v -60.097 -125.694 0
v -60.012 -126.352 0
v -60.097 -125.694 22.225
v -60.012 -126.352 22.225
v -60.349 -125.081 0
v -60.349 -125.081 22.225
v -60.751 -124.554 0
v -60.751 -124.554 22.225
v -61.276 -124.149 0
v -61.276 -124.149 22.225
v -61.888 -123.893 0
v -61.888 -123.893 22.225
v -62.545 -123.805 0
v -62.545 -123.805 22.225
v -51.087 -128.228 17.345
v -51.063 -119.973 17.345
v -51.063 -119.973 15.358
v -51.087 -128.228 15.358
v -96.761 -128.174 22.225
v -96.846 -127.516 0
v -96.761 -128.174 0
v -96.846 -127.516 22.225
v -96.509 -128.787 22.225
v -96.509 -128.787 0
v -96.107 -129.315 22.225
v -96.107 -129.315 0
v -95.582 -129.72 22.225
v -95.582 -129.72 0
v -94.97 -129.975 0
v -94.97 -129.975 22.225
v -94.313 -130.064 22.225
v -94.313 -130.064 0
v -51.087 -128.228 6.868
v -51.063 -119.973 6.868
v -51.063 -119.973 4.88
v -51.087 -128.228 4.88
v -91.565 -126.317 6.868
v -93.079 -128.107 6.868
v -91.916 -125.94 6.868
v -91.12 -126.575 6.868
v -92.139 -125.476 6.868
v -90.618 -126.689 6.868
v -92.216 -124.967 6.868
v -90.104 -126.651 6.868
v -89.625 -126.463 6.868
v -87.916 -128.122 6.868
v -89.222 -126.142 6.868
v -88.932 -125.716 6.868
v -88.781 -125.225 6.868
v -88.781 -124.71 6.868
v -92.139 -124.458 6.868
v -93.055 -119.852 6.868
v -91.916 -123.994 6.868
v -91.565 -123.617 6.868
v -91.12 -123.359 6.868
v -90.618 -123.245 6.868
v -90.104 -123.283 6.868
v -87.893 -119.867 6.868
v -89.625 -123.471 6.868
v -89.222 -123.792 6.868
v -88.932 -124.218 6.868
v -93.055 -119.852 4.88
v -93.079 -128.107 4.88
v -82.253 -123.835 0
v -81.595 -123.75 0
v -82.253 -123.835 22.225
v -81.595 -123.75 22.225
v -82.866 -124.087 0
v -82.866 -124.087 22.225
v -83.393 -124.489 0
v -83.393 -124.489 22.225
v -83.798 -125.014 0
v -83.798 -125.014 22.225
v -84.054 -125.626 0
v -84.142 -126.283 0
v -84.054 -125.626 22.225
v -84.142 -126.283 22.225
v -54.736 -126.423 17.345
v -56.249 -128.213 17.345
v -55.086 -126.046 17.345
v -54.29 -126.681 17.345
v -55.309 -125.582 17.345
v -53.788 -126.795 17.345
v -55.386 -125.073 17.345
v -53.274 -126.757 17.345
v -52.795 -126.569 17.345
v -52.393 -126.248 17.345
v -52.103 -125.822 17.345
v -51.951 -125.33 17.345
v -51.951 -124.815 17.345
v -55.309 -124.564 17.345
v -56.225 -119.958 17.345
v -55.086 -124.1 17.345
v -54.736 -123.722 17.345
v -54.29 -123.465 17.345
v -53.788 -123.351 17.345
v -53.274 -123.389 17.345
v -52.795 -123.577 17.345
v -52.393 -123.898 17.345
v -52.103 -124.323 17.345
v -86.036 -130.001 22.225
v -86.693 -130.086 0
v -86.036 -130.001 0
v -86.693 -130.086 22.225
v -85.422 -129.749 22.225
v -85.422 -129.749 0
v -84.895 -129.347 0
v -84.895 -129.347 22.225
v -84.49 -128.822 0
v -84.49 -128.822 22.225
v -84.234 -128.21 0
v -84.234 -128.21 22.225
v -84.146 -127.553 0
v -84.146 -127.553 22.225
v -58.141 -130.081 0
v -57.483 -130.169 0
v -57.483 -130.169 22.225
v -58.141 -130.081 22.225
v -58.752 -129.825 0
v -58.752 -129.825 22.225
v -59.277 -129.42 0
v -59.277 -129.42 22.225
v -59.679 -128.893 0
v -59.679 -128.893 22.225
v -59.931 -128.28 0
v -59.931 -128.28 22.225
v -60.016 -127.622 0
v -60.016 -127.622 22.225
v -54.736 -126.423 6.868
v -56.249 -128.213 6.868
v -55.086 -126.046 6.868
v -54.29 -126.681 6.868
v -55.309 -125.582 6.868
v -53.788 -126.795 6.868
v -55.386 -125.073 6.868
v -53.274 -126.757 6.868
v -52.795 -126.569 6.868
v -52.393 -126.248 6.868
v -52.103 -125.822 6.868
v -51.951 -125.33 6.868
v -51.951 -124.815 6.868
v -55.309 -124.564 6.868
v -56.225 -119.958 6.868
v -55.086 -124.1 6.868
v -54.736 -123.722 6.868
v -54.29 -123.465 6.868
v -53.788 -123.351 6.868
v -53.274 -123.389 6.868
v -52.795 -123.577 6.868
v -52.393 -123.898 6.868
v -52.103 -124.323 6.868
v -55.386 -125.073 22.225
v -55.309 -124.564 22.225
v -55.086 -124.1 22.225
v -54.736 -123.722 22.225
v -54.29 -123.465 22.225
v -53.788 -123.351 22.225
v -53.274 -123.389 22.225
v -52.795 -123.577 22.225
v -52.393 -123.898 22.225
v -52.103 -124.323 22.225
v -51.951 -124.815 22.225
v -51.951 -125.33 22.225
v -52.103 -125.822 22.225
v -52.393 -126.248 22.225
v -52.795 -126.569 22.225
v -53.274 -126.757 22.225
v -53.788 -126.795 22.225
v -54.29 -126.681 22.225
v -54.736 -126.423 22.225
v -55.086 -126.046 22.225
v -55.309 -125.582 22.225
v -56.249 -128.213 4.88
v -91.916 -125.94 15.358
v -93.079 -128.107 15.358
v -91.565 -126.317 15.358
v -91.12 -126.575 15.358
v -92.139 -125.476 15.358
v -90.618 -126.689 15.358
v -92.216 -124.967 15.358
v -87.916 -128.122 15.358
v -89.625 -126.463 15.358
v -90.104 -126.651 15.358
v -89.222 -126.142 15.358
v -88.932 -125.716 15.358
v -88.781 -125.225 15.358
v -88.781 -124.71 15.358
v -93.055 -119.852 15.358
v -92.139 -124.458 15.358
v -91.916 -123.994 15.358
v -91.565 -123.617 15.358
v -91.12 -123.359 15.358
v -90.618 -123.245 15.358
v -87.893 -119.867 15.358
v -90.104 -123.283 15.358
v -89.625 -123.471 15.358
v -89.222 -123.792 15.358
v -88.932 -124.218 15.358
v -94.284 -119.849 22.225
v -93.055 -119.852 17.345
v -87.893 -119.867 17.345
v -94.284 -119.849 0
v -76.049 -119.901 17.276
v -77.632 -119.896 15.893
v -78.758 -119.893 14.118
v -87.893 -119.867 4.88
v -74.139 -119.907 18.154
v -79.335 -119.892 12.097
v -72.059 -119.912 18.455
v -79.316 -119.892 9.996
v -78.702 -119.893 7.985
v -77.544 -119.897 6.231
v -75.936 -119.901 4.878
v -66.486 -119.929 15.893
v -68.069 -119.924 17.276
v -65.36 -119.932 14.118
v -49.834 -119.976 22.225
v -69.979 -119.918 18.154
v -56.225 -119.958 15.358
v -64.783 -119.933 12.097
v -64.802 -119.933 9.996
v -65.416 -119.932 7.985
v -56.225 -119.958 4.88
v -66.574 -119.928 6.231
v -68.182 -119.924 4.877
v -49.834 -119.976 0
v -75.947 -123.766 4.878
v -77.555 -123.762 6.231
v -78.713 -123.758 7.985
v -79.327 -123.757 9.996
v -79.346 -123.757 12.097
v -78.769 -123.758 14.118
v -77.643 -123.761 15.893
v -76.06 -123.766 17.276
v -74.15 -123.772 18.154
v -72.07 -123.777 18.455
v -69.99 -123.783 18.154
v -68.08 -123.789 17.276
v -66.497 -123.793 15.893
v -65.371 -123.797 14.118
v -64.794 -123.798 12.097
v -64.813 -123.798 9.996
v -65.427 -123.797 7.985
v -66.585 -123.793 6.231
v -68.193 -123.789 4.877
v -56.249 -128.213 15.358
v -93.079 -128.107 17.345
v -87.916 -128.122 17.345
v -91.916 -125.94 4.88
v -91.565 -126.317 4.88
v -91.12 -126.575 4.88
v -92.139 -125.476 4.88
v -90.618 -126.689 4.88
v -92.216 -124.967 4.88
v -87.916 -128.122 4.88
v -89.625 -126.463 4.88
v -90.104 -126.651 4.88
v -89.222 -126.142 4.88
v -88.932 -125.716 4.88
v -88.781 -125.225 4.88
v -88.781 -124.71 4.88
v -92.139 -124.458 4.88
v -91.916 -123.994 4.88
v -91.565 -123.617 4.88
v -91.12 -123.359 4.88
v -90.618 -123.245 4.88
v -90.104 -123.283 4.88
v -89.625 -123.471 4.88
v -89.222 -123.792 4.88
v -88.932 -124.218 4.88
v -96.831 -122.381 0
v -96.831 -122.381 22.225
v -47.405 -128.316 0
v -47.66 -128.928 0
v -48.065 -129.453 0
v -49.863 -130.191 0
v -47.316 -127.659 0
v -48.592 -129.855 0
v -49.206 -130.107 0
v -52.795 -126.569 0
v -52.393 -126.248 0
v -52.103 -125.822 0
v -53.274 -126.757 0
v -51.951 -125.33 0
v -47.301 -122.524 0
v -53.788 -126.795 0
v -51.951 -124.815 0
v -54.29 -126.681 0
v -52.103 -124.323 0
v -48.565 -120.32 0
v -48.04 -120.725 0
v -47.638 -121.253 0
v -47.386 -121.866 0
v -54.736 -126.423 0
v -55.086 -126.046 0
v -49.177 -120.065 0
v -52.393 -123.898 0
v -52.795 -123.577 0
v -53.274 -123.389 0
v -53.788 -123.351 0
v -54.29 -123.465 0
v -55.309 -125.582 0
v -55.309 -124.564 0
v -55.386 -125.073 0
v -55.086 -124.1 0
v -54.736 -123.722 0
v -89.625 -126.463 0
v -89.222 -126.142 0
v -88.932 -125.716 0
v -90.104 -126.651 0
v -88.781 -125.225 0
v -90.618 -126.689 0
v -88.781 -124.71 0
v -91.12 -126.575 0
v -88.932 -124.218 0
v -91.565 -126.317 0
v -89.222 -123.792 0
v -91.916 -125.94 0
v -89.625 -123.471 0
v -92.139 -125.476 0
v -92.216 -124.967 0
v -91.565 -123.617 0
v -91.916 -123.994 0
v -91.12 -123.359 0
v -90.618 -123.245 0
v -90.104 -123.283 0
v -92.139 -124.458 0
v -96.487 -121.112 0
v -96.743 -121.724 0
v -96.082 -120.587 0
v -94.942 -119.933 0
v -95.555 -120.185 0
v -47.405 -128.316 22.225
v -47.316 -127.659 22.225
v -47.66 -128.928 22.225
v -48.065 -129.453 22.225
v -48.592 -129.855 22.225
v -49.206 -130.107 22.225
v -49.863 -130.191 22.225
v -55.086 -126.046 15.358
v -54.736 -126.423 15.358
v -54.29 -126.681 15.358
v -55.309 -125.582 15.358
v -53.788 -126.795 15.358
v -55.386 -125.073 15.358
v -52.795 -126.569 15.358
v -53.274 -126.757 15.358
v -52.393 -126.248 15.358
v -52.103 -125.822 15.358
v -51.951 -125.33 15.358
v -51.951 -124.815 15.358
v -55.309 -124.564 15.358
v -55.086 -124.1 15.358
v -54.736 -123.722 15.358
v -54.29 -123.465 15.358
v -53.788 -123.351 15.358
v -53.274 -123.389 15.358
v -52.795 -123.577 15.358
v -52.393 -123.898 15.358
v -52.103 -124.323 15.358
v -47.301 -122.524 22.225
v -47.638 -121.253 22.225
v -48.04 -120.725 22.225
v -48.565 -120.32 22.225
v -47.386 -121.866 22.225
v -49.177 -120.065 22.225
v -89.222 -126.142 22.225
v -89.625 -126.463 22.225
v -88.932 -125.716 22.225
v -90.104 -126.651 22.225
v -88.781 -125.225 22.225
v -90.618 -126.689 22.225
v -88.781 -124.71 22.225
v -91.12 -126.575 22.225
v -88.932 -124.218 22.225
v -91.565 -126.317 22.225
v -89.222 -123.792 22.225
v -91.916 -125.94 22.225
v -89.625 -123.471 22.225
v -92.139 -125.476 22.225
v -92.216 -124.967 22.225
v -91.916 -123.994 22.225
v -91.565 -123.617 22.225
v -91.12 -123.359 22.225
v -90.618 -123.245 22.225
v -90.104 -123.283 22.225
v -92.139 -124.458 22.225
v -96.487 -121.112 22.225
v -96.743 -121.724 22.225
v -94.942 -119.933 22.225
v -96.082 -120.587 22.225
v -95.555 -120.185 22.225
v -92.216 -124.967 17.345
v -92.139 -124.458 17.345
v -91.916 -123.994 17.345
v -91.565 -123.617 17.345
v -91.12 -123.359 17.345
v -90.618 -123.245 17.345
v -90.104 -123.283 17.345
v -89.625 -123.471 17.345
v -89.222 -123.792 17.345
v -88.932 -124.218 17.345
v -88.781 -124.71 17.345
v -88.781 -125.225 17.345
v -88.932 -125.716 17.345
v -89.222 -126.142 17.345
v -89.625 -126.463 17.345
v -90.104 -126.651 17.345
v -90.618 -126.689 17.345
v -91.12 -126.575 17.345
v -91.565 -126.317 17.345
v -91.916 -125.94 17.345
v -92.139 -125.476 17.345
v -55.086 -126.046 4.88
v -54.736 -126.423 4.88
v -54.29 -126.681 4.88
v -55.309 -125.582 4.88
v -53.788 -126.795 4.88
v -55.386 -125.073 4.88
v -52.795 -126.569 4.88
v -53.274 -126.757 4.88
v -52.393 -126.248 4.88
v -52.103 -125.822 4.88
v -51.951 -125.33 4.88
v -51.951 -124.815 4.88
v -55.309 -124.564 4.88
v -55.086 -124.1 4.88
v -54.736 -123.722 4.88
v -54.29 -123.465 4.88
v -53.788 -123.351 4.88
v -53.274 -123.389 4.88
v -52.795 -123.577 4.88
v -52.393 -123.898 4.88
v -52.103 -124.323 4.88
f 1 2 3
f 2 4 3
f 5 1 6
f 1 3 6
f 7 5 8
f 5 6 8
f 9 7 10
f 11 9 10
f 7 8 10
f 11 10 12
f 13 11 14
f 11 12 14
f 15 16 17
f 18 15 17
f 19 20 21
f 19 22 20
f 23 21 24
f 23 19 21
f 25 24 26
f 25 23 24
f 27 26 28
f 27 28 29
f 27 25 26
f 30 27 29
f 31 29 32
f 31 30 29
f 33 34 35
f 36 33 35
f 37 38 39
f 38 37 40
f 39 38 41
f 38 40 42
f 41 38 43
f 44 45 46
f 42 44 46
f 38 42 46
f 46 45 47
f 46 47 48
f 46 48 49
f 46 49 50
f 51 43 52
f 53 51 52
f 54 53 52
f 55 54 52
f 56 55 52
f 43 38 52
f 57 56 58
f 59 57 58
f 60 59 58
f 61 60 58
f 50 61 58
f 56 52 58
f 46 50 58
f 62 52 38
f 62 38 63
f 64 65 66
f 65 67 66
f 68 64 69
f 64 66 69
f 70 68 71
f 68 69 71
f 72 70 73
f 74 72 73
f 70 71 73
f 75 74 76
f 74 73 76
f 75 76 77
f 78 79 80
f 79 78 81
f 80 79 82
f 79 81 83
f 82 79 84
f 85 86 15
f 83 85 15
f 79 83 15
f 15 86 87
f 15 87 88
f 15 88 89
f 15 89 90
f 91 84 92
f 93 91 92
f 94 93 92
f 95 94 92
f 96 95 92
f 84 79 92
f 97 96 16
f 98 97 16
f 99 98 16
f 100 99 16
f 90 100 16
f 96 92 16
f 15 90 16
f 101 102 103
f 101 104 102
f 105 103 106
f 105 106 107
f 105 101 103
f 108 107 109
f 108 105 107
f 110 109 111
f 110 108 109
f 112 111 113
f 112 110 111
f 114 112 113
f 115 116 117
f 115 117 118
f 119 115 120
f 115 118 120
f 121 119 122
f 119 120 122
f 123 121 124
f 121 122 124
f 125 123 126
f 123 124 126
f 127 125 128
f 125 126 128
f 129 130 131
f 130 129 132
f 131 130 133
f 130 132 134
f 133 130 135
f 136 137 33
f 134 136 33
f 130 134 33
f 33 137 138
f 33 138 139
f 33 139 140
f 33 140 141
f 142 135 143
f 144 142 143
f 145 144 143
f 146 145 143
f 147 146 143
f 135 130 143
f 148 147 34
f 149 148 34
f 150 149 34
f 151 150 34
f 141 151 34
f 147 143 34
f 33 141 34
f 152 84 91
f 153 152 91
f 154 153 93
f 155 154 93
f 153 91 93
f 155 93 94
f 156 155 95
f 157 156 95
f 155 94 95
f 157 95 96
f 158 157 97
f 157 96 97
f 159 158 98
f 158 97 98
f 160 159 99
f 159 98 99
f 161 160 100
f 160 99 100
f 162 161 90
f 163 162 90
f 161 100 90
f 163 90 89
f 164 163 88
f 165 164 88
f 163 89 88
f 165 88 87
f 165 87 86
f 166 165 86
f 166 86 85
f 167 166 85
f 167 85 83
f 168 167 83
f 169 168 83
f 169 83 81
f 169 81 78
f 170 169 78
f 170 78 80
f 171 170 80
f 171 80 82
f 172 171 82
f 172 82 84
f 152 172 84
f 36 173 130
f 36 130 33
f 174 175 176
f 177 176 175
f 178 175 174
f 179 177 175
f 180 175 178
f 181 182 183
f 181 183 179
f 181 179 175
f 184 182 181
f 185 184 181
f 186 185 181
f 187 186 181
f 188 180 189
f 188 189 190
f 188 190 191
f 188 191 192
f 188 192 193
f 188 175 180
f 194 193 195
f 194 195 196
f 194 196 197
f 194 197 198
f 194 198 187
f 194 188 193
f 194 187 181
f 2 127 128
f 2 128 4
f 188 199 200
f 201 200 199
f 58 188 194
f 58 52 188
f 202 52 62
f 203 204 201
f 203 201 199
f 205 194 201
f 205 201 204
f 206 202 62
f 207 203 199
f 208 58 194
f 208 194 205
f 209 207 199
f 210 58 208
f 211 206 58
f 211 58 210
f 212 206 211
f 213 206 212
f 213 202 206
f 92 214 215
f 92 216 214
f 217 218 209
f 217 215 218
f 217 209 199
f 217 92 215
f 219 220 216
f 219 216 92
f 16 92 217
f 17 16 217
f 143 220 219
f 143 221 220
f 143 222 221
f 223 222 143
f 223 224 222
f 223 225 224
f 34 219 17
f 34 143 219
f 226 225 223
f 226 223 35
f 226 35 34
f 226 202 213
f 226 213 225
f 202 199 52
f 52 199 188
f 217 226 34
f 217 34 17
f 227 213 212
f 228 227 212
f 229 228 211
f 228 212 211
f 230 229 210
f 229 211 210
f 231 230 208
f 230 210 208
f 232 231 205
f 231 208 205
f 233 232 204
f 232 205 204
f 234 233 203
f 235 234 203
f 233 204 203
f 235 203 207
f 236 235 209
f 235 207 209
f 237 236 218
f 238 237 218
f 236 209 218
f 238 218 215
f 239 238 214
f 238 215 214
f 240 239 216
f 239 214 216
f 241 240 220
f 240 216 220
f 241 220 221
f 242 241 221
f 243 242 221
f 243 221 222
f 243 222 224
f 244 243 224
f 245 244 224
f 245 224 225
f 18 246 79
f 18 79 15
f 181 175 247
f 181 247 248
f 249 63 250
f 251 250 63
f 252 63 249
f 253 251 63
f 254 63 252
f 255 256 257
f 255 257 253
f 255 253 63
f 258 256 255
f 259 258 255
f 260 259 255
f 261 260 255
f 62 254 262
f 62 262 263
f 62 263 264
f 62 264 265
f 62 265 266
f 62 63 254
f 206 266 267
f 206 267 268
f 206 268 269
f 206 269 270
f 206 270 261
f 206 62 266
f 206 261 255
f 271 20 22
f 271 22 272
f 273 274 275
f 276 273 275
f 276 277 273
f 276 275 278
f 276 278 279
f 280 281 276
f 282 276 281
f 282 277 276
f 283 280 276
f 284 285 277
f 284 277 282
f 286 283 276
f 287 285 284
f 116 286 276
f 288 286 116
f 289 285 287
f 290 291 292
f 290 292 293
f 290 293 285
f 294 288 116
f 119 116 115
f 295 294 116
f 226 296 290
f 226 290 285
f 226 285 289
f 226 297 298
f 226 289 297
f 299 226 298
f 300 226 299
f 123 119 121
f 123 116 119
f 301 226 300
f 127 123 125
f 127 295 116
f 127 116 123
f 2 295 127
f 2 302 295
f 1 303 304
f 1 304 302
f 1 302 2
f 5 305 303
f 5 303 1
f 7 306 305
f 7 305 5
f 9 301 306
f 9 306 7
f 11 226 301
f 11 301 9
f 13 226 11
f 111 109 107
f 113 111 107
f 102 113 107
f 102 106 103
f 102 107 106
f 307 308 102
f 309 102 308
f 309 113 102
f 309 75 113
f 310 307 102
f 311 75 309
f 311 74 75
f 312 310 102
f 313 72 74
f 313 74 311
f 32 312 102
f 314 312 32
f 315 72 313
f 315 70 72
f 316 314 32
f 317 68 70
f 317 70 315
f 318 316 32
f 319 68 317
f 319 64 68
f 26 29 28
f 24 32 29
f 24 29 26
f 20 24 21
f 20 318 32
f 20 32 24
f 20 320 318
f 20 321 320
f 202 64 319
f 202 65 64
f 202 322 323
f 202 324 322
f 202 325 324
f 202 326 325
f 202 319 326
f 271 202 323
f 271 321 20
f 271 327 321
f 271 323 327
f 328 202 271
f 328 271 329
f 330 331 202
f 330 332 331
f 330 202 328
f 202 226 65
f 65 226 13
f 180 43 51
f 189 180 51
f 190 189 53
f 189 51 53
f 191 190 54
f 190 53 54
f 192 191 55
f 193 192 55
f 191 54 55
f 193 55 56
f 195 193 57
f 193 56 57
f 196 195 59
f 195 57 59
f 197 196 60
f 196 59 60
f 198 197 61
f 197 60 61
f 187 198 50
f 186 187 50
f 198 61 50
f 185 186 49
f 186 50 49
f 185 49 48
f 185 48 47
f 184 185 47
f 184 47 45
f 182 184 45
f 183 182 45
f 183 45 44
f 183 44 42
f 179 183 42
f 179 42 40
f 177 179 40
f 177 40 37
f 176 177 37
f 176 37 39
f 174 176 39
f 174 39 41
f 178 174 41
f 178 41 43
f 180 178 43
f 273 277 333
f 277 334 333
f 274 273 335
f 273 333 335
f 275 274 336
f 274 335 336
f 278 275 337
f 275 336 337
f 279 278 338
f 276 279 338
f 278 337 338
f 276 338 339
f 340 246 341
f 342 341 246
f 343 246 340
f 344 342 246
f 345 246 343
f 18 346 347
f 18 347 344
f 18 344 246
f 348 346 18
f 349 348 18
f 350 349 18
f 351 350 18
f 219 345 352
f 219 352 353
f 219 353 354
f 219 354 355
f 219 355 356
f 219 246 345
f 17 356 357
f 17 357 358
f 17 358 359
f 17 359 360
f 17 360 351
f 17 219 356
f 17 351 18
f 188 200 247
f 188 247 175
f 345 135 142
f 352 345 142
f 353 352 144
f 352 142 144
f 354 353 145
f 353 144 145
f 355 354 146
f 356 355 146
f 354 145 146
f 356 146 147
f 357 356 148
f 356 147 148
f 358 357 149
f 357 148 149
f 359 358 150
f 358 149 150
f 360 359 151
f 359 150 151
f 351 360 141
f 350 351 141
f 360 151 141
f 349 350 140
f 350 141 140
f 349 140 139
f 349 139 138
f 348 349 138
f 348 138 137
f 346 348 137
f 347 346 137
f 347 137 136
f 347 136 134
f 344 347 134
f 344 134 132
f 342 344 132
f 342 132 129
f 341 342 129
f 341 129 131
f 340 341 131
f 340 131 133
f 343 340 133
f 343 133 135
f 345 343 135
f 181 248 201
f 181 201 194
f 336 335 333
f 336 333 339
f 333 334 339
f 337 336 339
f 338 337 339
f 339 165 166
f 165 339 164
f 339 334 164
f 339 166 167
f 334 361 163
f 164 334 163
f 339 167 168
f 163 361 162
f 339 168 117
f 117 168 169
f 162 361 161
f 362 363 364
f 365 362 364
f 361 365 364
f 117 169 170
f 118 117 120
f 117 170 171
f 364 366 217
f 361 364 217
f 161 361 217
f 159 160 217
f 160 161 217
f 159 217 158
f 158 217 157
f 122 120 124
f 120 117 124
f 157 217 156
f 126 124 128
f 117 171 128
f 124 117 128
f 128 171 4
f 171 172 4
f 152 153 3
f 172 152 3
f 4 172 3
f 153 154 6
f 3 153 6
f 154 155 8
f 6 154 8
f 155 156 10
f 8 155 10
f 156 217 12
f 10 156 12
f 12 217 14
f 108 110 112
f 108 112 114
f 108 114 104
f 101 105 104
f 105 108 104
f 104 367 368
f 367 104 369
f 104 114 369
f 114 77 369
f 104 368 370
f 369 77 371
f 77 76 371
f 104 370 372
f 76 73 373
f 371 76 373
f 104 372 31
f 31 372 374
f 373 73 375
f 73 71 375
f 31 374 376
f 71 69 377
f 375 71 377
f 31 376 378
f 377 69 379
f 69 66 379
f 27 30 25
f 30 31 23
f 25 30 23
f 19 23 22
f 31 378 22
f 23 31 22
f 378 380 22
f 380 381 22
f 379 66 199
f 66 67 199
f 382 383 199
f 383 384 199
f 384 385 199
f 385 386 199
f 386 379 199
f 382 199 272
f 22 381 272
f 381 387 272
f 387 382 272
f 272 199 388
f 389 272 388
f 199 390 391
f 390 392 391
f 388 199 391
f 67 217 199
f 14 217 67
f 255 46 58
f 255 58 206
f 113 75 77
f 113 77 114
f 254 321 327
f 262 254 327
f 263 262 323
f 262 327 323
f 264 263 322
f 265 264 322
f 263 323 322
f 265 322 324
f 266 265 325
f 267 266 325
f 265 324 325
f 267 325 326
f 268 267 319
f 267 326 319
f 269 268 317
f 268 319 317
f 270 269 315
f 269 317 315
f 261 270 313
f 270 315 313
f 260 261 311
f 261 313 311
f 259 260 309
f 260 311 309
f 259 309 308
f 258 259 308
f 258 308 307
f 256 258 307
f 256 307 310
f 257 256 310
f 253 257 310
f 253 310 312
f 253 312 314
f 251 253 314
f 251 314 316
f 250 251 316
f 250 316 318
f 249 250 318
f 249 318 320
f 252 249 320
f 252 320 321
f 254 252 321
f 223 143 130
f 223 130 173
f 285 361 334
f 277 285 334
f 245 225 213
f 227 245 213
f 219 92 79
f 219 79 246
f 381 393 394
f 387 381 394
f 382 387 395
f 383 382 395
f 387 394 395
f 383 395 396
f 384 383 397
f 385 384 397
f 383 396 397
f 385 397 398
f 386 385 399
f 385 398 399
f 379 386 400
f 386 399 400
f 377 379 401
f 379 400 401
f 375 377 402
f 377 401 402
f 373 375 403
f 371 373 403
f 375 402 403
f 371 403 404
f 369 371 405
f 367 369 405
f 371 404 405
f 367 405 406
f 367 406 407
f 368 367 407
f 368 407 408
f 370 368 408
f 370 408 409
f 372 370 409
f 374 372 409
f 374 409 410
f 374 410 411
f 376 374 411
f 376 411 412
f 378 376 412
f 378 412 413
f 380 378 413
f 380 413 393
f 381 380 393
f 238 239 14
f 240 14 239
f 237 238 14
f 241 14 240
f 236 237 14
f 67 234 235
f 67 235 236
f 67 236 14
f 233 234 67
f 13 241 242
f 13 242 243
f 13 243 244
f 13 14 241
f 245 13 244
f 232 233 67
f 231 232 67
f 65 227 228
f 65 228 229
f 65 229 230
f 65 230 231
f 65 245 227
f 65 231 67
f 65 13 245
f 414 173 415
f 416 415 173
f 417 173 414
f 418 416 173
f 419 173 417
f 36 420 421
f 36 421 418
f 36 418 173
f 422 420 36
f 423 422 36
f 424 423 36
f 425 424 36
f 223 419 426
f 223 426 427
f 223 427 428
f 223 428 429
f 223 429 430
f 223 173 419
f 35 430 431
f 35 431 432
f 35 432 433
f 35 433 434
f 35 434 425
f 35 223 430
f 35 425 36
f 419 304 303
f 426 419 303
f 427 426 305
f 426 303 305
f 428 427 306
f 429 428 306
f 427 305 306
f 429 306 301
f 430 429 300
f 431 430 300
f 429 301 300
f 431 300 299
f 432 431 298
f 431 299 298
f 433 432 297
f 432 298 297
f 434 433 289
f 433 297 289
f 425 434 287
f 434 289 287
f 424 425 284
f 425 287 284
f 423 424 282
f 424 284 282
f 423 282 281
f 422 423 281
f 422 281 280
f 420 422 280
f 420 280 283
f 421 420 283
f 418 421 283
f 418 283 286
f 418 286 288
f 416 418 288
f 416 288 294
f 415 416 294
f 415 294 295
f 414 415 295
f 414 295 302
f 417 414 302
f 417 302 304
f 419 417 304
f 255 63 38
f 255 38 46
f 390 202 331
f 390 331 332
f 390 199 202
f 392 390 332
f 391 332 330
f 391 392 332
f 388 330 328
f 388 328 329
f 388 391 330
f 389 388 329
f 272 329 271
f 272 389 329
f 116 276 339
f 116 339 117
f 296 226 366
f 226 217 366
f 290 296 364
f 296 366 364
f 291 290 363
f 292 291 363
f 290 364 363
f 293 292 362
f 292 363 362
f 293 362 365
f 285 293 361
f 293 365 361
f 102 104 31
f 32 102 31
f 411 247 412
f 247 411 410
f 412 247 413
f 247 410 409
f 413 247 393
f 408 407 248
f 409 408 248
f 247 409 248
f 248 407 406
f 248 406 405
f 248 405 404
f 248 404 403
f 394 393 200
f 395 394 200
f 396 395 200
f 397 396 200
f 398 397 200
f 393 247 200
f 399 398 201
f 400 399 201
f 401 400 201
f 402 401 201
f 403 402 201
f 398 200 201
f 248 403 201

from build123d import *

# Parameters (mm, degrees)
BOSS_EXTRUDE1_DEPTH   = 22.225
CUT_EXTRUDE1_REACH    = 12.357
FILLET1_R             = 2.54
F_4_CLEARANCE_HOLE1_D = 3.4544
SKETCH6_W             = 5.1625
SKETCH6_H             = 1.9875
CUT_EXTRUDE2_DEPTH    = 8.255


with BuildPart() as part:
    # Sketch1 → Boss-Extrude1 (new body)
    with BuildSketch(Plane.XY):
        Polygon((-96.82388635, -119.84135975), (-47.294090685, -119.983632078), (-47.323432737, -130.198589936), (-60.023380343, -130.162109852), (-60.005140301, -123.812136049), (-84.135040753, -123.742823889), (-84.153280795, -130.092797692), (-96.853228402, -130.056317608), align=None)
    extrude(amount=BOSS_EXTRUDE1_DEPTH)

    # Sketch2 → Cut-Extrude1 (cut, up to next)
    with BuildSketch(Plane(origin=(-0.345035492, -120.118491334, 0), x_dir=(0.999995875, -0.002872448, 0), z_dir=(0.002872448, 0.999995875, 0)), mode=Mode.PRIVATE) as cut_extrude1_sk1:
        with BuildLine():
            Line((-67.837073069, -4.8775), (-75.591424695, -4.8775))
            ThreePointArc((-75.591424695, -4.8775), (-71.714248882, -18.4546875), (-67.837073069, -4.8775))
        make_face()
    cut_extrude1_tool1 = extrude(cut_extrude1_sk1.sketch, amount=-CUT_EXTRUDE1_REACH, mode=Mode.PRIVATE) & part.part
    add(cut_extrude1_tool1.solids().sort_by_distance((-72.058989, -119.912496, 11.350092))[0], mode=Mode.SUBTRACT)

    # Fillet1
    fillet1_edges = [part.edges().sort_by_distance(p)[0] for p in [
        (-96.82388635, -119.84135975, 11.1125),
        (-47.294090685, -119.983632078, 11.1125),
        (-47.323432737, -130.198589936, 11.1125),
        (-60.023380343, -130.162109852, 11.1125),
        (-60.005140301, -123.812136049, 11.1125),
        (-84.135040753, -123.742823889, 11.1125),
        (-84.153280795, -130.092797692, 11.1125),
        (-96.853228402, -130.056317608, 11.1125),
    ]]
    fillet(fillet1_edges, radius=FILLET1_R)

    # #4 Clearance Hole1 (through all)
    with Locations(Plane.XY.offset(22.225)):
        with Locations((-90.488583573, -124.967078721), (-53.658735514, -125.072870965)):
            Hole(F_4_CLEARANCE_HOLE1_D / 2)

    # Sketch6 → Cut-Extrude2 (cut)
    with BuildSketch(Plane(origin=(-0.345035492, -120.118491334, 0), x_dir=(0.999995875, -0.002872448, 0), z_dir=(0.002872448, 0.999995875, 0))):
        with Locations((-90.129248882, -16.35125)):
            Rectangle(SKETCH6_W, SKETCH6_H)
        with Locations((-90.129248882, -5.87375)):
            Rectangle(SKETCH6_W, SKETCH6_H)
        with Locations((-53.299248882, -5.87375)):
            Rectangle(SKETCH6_W, SKETCH6_H)
        with Locations((-53.299248882, -16.35125)):
            Rectangle(SKETCH6_W, SKETCH6_H)
    extrude(amount=-CUT_EXTRUDE2_DEPTH, mode=Mode.SUBTRACT)


solid = part.part
